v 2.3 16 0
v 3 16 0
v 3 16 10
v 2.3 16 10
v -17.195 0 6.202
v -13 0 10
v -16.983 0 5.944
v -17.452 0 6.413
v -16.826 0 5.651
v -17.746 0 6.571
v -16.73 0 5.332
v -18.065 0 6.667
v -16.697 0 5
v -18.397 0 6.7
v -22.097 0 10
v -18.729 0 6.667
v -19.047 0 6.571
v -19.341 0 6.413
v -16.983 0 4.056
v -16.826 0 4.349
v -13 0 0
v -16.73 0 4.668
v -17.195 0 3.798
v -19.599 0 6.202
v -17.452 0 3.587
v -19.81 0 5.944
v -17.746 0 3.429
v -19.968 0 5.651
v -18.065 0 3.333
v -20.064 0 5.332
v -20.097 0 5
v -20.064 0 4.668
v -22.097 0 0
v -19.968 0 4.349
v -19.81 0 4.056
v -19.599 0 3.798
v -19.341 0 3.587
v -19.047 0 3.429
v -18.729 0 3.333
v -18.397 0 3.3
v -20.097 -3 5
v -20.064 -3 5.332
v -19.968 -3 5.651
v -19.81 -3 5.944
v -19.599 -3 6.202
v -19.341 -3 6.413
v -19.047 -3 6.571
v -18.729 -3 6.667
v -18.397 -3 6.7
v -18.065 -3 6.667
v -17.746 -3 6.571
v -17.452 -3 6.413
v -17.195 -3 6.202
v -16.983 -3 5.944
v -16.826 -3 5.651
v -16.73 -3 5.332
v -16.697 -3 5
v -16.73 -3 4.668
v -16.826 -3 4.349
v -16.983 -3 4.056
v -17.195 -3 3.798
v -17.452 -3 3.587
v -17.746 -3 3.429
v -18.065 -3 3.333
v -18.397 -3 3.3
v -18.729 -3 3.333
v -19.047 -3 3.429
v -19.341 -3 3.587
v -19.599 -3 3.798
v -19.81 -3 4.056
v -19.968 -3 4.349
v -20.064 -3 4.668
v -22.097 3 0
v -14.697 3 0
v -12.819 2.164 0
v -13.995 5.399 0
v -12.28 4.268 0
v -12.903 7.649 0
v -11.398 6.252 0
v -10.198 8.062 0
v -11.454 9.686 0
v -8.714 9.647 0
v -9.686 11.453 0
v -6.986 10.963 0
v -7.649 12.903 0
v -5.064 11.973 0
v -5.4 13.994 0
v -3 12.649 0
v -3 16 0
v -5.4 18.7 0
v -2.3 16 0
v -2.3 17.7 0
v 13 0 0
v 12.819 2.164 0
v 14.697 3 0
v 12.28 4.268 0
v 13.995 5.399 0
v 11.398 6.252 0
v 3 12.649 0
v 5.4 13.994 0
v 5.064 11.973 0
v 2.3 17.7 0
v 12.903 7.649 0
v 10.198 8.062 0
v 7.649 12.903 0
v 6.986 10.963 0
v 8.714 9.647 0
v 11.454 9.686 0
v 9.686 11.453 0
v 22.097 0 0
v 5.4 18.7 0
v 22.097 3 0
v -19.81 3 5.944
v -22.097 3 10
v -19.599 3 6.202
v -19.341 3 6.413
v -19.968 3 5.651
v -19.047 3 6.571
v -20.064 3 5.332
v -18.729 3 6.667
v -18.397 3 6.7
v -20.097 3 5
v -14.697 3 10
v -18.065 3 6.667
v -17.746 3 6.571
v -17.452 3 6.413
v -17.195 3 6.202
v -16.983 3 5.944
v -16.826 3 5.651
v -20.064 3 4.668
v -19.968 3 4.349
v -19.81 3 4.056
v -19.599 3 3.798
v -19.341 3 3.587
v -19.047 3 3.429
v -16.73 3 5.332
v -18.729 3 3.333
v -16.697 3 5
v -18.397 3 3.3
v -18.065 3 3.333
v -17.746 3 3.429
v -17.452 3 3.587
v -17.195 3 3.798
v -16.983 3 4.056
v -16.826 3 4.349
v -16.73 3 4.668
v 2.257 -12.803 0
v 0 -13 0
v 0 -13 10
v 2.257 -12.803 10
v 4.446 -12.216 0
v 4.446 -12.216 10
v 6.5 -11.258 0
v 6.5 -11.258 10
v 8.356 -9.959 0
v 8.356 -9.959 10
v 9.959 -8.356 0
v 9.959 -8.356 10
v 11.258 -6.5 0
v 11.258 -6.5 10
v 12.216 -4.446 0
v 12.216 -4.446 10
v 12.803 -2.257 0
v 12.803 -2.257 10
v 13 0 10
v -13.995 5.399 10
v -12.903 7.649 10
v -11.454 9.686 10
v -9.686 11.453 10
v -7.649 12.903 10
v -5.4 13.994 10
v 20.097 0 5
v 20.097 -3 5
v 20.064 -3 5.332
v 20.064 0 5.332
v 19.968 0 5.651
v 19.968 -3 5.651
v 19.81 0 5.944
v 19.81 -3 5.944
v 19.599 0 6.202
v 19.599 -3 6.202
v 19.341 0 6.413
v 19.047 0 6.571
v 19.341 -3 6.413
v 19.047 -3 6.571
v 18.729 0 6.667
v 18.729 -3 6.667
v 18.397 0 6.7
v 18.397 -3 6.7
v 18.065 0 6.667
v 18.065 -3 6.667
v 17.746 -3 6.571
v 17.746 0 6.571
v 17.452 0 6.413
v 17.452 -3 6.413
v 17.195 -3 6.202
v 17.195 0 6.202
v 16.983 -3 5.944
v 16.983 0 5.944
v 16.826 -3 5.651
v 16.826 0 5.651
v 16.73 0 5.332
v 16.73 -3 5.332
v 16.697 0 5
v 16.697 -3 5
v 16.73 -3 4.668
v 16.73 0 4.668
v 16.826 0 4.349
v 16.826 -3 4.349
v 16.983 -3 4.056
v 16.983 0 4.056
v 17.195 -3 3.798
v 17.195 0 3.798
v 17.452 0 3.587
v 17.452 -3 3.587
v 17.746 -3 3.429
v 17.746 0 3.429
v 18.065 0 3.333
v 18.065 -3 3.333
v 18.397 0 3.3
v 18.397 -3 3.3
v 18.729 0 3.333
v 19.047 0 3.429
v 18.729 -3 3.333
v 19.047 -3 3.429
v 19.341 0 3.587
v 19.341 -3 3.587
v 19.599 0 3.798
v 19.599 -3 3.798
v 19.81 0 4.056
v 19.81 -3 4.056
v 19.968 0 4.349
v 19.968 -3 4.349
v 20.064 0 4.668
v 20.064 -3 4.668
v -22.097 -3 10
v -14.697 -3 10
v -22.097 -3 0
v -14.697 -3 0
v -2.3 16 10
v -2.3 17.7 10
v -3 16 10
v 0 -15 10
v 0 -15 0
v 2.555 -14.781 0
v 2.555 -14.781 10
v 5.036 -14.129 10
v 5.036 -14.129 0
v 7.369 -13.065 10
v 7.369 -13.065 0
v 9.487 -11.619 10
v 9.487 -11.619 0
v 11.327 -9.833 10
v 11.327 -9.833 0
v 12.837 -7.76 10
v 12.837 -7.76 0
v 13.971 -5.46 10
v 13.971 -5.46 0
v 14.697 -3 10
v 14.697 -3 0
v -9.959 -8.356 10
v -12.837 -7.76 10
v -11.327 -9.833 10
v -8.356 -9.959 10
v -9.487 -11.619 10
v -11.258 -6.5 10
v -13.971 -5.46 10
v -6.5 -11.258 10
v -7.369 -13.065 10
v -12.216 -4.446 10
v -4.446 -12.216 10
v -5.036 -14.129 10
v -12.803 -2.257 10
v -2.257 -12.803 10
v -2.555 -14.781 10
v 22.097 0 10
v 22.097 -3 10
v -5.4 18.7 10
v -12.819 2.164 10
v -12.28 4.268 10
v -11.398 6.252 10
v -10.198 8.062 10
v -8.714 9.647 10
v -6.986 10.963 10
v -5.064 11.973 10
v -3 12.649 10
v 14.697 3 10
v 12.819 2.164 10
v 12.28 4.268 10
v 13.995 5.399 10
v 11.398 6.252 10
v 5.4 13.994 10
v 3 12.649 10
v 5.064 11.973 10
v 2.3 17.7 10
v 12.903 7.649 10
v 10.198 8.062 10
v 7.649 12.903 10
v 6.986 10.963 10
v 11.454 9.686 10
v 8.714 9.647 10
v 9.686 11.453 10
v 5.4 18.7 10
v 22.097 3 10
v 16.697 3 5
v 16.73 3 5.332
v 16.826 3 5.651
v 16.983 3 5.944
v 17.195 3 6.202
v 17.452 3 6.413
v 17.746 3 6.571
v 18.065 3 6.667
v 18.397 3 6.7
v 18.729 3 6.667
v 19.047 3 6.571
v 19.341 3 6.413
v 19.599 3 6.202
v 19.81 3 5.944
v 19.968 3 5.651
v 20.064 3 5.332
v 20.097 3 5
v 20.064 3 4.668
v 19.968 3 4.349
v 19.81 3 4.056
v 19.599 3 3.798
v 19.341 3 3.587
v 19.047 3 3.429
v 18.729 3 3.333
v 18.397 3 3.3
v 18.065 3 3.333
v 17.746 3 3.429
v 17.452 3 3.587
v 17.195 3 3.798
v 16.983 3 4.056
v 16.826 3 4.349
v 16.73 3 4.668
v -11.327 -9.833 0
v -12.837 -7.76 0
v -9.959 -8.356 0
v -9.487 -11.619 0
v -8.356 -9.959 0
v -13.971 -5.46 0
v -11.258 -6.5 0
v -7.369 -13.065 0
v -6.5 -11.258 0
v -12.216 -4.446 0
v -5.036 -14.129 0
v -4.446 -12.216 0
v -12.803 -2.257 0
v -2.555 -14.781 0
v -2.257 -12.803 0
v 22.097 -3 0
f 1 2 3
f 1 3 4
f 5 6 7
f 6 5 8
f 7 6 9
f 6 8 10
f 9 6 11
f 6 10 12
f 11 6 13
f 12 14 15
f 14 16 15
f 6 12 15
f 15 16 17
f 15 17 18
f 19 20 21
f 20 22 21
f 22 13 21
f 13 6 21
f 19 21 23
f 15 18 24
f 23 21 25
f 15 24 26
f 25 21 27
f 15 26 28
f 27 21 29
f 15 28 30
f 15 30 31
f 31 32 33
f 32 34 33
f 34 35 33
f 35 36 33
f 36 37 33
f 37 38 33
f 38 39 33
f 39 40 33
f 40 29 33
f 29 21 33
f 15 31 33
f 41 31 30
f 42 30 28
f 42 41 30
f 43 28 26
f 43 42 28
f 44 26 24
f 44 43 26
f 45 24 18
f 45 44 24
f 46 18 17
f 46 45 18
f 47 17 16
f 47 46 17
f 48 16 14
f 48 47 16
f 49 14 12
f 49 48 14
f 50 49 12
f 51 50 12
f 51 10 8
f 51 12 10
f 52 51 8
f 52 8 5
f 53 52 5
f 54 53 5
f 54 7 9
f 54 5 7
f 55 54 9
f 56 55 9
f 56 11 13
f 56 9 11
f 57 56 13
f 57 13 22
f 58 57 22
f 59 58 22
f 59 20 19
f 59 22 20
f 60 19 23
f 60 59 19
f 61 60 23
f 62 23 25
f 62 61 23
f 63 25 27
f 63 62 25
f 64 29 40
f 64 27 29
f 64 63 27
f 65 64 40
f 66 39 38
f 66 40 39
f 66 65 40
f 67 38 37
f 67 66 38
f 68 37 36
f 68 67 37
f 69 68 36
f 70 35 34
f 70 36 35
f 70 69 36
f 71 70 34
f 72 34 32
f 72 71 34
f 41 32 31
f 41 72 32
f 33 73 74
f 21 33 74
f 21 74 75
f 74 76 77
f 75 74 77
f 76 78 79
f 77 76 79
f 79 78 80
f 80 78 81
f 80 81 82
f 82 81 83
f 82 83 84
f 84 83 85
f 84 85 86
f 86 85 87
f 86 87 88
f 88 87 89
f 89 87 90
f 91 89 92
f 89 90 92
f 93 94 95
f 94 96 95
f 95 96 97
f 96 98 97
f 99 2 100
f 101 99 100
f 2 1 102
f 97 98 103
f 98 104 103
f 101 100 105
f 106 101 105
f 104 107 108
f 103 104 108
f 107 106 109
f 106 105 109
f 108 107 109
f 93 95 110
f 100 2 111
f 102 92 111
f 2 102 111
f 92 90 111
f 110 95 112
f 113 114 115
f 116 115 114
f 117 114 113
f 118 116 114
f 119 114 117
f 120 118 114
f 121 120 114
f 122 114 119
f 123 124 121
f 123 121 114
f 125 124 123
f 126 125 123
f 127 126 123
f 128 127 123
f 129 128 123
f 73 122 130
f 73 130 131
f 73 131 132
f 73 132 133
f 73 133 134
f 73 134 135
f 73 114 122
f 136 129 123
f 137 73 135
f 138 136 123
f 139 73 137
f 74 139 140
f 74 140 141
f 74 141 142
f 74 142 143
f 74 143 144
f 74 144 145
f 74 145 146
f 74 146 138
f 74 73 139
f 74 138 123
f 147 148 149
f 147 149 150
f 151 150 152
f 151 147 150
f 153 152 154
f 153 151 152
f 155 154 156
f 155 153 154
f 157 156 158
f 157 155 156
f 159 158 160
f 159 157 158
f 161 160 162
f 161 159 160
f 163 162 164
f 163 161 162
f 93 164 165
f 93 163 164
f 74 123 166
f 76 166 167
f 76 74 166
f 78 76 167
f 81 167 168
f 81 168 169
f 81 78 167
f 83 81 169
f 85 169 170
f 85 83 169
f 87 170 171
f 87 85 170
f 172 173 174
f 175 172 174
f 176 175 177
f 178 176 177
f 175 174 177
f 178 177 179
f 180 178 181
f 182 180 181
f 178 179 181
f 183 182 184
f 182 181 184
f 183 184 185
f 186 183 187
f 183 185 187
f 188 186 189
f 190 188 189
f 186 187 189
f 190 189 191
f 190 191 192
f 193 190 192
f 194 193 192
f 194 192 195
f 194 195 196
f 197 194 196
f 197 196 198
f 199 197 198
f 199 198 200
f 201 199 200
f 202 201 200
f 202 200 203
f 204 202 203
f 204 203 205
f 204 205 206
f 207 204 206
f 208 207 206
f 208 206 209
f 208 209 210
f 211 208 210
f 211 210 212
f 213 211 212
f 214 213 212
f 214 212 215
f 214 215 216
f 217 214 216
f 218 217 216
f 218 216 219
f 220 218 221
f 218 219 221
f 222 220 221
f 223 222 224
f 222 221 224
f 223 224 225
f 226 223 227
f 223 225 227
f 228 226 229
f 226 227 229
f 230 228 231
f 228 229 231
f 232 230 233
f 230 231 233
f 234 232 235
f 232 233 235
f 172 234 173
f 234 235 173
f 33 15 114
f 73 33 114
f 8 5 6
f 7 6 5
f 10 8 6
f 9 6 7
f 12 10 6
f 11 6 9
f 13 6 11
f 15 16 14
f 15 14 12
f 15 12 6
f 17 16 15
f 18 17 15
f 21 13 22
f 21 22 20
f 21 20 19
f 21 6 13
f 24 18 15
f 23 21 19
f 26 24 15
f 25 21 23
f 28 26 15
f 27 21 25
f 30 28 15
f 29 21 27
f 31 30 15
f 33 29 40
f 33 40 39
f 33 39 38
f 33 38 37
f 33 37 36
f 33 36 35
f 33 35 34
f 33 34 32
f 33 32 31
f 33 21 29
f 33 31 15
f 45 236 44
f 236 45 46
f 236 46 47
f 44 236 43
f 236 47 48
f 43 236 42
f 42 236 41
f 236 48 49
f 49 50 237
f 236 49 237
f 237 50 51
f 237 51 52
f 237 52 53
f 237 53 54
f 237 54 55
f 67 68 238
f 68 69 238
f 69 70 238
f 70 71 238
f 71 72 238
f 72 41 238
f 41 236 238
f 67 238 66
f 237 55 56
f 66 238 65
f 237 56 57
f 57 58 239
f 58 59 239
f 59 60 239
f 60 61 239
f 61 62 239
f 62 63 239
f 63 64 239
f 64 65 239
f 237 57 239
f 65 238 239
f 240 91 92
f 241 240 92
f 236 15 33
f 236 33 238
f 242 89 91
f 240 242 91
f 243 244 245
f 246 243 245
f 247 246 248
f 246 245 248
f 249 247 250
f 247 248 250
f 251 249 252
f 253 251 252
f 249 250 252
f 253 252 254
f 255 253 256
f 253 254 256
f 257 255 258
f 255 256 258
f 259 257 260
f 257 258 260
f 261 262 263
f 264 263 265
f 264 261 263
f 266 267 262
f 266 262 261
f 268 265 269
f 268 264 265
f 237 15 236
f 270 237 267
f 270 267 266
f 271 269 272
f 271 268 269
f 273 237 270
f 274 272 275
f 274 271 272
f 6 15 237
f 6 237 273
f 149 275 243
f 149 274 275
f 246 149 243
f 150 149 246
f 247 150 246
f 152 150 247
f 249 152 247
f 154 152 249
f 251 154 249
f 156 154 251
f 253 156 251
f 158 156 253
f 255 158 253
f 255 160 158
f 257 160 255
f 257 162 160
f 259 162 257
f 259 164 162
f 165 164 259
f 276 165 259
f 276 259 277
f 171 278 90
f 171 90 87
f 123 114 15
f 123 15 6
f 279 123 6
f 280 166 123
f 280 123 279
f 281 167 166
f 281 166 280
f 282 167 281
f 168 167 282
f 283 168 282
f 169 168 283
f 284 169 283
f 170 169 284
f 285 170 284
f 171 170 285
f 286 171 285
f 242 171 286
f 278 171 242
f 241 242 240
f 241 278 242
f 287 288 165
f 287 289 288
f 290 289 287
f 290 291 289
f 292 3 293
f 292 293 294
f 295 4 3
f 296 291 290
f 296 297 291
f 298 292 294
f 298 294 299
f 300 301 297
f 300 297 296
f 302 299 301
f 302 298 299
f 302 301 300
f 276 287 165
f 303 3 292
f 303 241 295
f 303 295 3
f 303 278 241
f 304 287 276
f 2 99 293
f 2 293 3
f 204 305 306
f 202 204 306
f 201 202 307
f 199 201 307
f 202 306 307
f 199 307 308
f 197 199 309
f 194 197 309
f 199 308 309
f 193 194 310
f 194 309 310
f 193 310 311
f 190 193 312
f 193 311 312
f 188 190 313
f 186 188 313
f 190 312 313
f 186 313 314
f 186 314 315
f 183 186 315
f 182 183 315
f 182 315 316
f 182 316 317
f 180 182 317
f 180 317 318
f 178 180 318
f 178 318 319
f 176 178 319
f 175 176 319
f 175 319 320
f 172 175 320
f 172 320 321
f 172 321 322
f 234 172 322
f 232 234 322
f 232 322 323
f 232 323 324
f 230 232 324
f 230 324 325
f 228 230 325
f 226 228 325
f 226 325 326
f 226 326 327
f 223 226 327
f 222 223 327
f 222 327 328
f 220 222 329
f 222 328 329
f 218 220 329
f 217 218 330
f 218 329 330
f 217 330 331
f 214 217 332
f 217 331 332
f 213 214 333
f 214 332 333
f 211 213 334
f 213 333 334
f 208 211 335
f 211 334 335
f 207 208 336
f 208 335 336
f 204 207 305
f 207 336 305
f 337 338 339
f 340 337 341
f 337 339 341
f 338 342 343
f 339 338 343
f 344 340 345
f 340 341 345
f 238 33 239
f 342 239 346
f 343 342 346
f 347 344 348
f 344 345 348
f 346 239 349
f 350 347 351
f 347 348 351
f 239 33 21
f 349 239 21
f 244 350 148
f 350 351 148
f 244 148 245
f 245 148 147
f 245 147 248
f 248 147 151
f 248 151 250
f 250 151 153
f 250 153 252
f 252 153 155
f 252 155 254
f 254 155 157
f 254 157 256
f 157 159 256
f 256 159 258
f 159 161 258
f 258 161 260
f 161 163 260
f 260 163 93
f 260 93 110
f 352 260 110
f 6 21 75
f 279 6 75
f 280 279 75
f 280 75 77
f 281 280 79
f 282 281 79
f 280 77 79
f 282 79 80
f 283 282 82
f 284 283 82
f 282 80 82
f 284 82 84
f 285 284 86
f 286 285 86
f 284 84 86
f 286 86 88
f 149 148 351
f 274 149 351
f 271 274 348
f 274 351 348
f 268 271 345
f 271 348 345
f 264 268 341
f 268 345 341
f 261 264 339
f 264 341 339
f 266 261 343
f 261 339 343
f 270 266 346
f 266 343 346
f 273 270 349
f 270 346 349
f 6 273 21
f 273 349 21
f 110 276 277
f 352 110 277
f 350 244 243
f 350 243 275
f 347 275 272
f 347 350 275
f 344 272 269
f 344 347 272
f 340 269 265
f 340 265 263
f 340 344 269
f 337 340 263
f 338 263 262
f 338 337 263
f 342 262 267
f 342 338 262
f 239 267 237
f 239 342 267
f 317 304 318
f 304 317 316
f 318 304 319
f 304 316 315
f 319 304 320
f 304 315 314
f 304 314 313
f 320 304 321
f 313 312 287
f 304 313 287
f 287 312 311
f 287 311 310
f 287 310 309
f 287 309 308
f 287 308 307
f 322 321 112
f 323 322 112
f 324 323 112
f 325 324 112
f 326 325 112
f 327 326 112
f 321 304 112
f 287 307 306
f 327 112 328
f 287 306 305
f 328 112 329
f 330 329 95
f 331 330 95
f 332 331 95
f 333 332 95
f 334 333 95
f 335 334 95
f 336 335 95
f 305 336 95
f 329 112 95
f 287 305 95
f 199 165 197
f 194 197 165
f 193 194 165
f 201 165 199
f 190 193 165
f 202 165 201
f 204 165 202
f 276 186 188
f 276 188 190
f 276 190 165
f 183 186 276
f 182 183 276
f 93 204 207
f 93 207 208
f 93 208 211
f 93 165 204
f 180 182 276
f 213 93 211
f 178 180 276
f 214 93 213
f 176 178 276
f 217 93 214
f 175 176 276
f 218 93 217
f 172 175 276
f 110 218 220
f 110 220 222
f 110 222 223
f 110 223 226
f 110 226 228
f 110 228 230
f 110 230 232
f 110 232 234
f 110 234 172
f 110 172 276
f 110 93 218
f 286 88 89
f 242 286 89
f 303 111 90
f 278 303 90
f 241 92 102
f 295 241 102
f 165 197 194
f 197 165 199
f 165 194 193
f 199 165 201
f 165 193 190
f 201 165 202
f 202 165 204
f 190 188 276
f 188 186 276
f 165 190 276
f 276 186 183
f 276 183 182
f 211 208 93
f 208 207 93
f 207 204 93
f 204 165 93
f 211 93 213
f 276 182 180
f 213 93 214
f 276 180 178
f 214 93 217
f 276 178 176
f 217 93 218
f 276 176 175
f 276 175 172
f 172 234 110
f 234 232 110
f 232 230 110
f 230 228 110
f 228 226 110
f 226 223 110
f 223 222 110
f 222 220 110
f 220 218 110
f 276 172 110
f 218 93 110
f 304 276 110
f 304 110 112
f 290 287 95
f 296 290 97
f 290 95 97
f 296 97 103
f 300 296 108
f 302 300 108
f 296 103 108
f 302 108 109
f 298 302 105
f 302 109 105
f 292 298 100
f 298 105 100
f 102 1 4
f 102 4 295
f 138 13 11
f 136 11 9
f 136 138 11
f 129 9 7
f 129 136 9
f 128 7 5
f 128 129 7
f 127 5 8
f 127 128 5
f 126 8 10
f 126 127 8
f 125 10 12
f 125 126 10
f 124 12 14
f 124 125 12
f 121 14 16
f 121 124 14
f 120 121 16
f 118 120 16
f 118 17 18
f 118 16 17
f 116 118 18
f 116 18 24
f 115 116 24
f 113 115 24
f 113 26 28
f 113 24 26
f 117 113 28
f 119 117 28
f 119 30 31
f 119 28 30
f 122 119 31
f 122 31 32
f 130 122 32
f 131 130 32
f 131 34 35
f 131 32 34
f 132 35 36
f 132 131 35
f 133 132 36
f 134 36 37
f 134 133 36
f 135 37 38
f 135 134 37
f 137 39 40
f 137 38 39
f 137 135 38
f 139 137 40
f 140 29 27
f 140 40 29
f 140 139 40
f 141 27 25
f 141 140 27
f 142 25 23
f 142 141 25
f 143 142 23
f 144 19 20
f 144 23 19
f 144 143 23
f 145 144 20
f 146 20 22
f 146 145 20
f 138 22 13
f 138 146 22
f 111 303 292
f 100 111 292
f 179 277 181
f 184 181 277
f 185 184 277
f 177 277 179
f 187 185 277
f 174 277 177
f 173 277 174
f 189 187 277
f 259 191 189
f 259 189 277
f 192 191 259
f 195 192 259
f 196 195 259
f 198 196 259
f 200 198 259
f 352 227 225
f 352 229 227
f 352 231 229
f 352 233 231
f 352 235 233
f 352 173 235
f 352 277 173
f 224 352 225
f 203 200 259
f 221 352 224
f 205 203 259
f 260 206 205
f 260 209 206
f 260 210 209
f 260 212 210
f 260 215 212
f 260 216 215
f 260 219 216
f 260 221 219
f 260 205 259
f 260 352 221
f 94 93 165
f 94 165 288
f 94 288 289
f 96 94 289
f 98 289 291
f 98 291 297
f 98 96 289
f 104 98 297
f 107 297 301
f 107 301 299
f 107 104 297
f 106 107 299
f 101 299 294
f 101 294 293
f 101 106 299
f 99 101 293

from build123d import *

# Parameters (mm, degrees)
PAD_DEPTH       = 10
SKETCH001_R     = 1.7
POCKET_DEPTH    = 5
PAD001_DEPTH    = 10
SKETCH003_R     = 1.7
POCKET001_DEPTH = 5


with BuildPart() as body:
    # Sketch → Pad (new body)
    with BuildSketch(Plane.XY):
        with BuildLine():
            ThreePointArc((13, 0), (10.198039, 8.062258), (3, 12.649111))
            Line((3, 12.649111), (3, 13))
            Line((3, 13), (3, 16))
            Line((3, 16), (2.3, 16))
            Line((2.3, 16), (2.3, 17.7))
            Line((2.3, 17.7), (0, 17.7))
            Line((0, 17.7), (0, 18.7))
            Line((0, 18.7), (5.4, 18.7))
            Line((5.4, 18.7), (5.4, 13.994285))
            ThreePointArc((14.696938, 3), (11.453834, 9.68554), (5.4, 13.994285))
            Line((22.096938, 3), (14.696938, 3))
            Line((22.096938, 0), (22.096938, 3))
            Line((13, 0), (22.096938, 0))
        make_face()
    pad = extrude(amount=PAD_DEPTH)

    # Sketch001 (on Face1 of Pad) → Pocket (cut)
    with BuildSketch(Plane(origin=(0, 3, 0), x_dir=(-1, 0, 0), z_dir=(0, 1, 0))):
        with Locations((-18.396938, 5)):
            Circle(SKETCH001_R)
    pocket = extrude(amount=-POCKET_DEPTH, mode=Mode.SUBTRACT)

    # Mirrored001: Pad, Pocket across Sketch V_Axis
    add(pad.mirror(Plane(origin=(0, 0, 0), x_dir=(0, 0, 1), z_dir=(1, 0, 0))))
    add(pocket.mirror(Plane(origin=(0, 0, 0), x_dir=(0, 0, 1), z_dir=(1, 0, 0))), mode=Mode.SUBTRACT)


with BuildPart() as body001:
    # Sketch002 → Pad001 (new body)
    with BuildSketch(Plane.XY):
        with BuildLine():
            ThreePointArc((0, -13), (9.192388, -9.192388), (13, 0))
            Line((13, 0), (22.096938, 0))
            Line((22.096938, 0), (22.096938, -3))
            Line((22.096938, -3), (14.696938, -3))
            ThreePointArc((0, -15), (9.486833, -11.61895), (14.696938, -3))
            Line((0, -13), (0, -15))
        make_face()
    pad001 = extrude(amount=PAD001_DEPTH)

    # Sketch003 (on Face4 of Pad001) → Pocket001 (cut)
    with BuildSketch(Plane.XZ.offset(3)):
        with Locations((18.396938, 5)):
            Circle(SKETCH003_R)
    pocket001 = extrude(amount=-POCKET001_DEPTH, mode=Mode.SUBTRACT)

    # Mirrored: Pad001, Pocket001 across Sketch002 V_Axis
    add(pad001.mirror(Plane(origin=(0, 0, 0), x_dir=(0, 0, 1), z_dir=(1, 0, 0))))
    add(pocket001.mirror(Plane(origin=(0, 0, 0), x_dir=(0, 0, 1), z_dir=(1, 0, 0))), mode=Mode.SUBTRACT)


solid = Compound([body.part, body001.part])
